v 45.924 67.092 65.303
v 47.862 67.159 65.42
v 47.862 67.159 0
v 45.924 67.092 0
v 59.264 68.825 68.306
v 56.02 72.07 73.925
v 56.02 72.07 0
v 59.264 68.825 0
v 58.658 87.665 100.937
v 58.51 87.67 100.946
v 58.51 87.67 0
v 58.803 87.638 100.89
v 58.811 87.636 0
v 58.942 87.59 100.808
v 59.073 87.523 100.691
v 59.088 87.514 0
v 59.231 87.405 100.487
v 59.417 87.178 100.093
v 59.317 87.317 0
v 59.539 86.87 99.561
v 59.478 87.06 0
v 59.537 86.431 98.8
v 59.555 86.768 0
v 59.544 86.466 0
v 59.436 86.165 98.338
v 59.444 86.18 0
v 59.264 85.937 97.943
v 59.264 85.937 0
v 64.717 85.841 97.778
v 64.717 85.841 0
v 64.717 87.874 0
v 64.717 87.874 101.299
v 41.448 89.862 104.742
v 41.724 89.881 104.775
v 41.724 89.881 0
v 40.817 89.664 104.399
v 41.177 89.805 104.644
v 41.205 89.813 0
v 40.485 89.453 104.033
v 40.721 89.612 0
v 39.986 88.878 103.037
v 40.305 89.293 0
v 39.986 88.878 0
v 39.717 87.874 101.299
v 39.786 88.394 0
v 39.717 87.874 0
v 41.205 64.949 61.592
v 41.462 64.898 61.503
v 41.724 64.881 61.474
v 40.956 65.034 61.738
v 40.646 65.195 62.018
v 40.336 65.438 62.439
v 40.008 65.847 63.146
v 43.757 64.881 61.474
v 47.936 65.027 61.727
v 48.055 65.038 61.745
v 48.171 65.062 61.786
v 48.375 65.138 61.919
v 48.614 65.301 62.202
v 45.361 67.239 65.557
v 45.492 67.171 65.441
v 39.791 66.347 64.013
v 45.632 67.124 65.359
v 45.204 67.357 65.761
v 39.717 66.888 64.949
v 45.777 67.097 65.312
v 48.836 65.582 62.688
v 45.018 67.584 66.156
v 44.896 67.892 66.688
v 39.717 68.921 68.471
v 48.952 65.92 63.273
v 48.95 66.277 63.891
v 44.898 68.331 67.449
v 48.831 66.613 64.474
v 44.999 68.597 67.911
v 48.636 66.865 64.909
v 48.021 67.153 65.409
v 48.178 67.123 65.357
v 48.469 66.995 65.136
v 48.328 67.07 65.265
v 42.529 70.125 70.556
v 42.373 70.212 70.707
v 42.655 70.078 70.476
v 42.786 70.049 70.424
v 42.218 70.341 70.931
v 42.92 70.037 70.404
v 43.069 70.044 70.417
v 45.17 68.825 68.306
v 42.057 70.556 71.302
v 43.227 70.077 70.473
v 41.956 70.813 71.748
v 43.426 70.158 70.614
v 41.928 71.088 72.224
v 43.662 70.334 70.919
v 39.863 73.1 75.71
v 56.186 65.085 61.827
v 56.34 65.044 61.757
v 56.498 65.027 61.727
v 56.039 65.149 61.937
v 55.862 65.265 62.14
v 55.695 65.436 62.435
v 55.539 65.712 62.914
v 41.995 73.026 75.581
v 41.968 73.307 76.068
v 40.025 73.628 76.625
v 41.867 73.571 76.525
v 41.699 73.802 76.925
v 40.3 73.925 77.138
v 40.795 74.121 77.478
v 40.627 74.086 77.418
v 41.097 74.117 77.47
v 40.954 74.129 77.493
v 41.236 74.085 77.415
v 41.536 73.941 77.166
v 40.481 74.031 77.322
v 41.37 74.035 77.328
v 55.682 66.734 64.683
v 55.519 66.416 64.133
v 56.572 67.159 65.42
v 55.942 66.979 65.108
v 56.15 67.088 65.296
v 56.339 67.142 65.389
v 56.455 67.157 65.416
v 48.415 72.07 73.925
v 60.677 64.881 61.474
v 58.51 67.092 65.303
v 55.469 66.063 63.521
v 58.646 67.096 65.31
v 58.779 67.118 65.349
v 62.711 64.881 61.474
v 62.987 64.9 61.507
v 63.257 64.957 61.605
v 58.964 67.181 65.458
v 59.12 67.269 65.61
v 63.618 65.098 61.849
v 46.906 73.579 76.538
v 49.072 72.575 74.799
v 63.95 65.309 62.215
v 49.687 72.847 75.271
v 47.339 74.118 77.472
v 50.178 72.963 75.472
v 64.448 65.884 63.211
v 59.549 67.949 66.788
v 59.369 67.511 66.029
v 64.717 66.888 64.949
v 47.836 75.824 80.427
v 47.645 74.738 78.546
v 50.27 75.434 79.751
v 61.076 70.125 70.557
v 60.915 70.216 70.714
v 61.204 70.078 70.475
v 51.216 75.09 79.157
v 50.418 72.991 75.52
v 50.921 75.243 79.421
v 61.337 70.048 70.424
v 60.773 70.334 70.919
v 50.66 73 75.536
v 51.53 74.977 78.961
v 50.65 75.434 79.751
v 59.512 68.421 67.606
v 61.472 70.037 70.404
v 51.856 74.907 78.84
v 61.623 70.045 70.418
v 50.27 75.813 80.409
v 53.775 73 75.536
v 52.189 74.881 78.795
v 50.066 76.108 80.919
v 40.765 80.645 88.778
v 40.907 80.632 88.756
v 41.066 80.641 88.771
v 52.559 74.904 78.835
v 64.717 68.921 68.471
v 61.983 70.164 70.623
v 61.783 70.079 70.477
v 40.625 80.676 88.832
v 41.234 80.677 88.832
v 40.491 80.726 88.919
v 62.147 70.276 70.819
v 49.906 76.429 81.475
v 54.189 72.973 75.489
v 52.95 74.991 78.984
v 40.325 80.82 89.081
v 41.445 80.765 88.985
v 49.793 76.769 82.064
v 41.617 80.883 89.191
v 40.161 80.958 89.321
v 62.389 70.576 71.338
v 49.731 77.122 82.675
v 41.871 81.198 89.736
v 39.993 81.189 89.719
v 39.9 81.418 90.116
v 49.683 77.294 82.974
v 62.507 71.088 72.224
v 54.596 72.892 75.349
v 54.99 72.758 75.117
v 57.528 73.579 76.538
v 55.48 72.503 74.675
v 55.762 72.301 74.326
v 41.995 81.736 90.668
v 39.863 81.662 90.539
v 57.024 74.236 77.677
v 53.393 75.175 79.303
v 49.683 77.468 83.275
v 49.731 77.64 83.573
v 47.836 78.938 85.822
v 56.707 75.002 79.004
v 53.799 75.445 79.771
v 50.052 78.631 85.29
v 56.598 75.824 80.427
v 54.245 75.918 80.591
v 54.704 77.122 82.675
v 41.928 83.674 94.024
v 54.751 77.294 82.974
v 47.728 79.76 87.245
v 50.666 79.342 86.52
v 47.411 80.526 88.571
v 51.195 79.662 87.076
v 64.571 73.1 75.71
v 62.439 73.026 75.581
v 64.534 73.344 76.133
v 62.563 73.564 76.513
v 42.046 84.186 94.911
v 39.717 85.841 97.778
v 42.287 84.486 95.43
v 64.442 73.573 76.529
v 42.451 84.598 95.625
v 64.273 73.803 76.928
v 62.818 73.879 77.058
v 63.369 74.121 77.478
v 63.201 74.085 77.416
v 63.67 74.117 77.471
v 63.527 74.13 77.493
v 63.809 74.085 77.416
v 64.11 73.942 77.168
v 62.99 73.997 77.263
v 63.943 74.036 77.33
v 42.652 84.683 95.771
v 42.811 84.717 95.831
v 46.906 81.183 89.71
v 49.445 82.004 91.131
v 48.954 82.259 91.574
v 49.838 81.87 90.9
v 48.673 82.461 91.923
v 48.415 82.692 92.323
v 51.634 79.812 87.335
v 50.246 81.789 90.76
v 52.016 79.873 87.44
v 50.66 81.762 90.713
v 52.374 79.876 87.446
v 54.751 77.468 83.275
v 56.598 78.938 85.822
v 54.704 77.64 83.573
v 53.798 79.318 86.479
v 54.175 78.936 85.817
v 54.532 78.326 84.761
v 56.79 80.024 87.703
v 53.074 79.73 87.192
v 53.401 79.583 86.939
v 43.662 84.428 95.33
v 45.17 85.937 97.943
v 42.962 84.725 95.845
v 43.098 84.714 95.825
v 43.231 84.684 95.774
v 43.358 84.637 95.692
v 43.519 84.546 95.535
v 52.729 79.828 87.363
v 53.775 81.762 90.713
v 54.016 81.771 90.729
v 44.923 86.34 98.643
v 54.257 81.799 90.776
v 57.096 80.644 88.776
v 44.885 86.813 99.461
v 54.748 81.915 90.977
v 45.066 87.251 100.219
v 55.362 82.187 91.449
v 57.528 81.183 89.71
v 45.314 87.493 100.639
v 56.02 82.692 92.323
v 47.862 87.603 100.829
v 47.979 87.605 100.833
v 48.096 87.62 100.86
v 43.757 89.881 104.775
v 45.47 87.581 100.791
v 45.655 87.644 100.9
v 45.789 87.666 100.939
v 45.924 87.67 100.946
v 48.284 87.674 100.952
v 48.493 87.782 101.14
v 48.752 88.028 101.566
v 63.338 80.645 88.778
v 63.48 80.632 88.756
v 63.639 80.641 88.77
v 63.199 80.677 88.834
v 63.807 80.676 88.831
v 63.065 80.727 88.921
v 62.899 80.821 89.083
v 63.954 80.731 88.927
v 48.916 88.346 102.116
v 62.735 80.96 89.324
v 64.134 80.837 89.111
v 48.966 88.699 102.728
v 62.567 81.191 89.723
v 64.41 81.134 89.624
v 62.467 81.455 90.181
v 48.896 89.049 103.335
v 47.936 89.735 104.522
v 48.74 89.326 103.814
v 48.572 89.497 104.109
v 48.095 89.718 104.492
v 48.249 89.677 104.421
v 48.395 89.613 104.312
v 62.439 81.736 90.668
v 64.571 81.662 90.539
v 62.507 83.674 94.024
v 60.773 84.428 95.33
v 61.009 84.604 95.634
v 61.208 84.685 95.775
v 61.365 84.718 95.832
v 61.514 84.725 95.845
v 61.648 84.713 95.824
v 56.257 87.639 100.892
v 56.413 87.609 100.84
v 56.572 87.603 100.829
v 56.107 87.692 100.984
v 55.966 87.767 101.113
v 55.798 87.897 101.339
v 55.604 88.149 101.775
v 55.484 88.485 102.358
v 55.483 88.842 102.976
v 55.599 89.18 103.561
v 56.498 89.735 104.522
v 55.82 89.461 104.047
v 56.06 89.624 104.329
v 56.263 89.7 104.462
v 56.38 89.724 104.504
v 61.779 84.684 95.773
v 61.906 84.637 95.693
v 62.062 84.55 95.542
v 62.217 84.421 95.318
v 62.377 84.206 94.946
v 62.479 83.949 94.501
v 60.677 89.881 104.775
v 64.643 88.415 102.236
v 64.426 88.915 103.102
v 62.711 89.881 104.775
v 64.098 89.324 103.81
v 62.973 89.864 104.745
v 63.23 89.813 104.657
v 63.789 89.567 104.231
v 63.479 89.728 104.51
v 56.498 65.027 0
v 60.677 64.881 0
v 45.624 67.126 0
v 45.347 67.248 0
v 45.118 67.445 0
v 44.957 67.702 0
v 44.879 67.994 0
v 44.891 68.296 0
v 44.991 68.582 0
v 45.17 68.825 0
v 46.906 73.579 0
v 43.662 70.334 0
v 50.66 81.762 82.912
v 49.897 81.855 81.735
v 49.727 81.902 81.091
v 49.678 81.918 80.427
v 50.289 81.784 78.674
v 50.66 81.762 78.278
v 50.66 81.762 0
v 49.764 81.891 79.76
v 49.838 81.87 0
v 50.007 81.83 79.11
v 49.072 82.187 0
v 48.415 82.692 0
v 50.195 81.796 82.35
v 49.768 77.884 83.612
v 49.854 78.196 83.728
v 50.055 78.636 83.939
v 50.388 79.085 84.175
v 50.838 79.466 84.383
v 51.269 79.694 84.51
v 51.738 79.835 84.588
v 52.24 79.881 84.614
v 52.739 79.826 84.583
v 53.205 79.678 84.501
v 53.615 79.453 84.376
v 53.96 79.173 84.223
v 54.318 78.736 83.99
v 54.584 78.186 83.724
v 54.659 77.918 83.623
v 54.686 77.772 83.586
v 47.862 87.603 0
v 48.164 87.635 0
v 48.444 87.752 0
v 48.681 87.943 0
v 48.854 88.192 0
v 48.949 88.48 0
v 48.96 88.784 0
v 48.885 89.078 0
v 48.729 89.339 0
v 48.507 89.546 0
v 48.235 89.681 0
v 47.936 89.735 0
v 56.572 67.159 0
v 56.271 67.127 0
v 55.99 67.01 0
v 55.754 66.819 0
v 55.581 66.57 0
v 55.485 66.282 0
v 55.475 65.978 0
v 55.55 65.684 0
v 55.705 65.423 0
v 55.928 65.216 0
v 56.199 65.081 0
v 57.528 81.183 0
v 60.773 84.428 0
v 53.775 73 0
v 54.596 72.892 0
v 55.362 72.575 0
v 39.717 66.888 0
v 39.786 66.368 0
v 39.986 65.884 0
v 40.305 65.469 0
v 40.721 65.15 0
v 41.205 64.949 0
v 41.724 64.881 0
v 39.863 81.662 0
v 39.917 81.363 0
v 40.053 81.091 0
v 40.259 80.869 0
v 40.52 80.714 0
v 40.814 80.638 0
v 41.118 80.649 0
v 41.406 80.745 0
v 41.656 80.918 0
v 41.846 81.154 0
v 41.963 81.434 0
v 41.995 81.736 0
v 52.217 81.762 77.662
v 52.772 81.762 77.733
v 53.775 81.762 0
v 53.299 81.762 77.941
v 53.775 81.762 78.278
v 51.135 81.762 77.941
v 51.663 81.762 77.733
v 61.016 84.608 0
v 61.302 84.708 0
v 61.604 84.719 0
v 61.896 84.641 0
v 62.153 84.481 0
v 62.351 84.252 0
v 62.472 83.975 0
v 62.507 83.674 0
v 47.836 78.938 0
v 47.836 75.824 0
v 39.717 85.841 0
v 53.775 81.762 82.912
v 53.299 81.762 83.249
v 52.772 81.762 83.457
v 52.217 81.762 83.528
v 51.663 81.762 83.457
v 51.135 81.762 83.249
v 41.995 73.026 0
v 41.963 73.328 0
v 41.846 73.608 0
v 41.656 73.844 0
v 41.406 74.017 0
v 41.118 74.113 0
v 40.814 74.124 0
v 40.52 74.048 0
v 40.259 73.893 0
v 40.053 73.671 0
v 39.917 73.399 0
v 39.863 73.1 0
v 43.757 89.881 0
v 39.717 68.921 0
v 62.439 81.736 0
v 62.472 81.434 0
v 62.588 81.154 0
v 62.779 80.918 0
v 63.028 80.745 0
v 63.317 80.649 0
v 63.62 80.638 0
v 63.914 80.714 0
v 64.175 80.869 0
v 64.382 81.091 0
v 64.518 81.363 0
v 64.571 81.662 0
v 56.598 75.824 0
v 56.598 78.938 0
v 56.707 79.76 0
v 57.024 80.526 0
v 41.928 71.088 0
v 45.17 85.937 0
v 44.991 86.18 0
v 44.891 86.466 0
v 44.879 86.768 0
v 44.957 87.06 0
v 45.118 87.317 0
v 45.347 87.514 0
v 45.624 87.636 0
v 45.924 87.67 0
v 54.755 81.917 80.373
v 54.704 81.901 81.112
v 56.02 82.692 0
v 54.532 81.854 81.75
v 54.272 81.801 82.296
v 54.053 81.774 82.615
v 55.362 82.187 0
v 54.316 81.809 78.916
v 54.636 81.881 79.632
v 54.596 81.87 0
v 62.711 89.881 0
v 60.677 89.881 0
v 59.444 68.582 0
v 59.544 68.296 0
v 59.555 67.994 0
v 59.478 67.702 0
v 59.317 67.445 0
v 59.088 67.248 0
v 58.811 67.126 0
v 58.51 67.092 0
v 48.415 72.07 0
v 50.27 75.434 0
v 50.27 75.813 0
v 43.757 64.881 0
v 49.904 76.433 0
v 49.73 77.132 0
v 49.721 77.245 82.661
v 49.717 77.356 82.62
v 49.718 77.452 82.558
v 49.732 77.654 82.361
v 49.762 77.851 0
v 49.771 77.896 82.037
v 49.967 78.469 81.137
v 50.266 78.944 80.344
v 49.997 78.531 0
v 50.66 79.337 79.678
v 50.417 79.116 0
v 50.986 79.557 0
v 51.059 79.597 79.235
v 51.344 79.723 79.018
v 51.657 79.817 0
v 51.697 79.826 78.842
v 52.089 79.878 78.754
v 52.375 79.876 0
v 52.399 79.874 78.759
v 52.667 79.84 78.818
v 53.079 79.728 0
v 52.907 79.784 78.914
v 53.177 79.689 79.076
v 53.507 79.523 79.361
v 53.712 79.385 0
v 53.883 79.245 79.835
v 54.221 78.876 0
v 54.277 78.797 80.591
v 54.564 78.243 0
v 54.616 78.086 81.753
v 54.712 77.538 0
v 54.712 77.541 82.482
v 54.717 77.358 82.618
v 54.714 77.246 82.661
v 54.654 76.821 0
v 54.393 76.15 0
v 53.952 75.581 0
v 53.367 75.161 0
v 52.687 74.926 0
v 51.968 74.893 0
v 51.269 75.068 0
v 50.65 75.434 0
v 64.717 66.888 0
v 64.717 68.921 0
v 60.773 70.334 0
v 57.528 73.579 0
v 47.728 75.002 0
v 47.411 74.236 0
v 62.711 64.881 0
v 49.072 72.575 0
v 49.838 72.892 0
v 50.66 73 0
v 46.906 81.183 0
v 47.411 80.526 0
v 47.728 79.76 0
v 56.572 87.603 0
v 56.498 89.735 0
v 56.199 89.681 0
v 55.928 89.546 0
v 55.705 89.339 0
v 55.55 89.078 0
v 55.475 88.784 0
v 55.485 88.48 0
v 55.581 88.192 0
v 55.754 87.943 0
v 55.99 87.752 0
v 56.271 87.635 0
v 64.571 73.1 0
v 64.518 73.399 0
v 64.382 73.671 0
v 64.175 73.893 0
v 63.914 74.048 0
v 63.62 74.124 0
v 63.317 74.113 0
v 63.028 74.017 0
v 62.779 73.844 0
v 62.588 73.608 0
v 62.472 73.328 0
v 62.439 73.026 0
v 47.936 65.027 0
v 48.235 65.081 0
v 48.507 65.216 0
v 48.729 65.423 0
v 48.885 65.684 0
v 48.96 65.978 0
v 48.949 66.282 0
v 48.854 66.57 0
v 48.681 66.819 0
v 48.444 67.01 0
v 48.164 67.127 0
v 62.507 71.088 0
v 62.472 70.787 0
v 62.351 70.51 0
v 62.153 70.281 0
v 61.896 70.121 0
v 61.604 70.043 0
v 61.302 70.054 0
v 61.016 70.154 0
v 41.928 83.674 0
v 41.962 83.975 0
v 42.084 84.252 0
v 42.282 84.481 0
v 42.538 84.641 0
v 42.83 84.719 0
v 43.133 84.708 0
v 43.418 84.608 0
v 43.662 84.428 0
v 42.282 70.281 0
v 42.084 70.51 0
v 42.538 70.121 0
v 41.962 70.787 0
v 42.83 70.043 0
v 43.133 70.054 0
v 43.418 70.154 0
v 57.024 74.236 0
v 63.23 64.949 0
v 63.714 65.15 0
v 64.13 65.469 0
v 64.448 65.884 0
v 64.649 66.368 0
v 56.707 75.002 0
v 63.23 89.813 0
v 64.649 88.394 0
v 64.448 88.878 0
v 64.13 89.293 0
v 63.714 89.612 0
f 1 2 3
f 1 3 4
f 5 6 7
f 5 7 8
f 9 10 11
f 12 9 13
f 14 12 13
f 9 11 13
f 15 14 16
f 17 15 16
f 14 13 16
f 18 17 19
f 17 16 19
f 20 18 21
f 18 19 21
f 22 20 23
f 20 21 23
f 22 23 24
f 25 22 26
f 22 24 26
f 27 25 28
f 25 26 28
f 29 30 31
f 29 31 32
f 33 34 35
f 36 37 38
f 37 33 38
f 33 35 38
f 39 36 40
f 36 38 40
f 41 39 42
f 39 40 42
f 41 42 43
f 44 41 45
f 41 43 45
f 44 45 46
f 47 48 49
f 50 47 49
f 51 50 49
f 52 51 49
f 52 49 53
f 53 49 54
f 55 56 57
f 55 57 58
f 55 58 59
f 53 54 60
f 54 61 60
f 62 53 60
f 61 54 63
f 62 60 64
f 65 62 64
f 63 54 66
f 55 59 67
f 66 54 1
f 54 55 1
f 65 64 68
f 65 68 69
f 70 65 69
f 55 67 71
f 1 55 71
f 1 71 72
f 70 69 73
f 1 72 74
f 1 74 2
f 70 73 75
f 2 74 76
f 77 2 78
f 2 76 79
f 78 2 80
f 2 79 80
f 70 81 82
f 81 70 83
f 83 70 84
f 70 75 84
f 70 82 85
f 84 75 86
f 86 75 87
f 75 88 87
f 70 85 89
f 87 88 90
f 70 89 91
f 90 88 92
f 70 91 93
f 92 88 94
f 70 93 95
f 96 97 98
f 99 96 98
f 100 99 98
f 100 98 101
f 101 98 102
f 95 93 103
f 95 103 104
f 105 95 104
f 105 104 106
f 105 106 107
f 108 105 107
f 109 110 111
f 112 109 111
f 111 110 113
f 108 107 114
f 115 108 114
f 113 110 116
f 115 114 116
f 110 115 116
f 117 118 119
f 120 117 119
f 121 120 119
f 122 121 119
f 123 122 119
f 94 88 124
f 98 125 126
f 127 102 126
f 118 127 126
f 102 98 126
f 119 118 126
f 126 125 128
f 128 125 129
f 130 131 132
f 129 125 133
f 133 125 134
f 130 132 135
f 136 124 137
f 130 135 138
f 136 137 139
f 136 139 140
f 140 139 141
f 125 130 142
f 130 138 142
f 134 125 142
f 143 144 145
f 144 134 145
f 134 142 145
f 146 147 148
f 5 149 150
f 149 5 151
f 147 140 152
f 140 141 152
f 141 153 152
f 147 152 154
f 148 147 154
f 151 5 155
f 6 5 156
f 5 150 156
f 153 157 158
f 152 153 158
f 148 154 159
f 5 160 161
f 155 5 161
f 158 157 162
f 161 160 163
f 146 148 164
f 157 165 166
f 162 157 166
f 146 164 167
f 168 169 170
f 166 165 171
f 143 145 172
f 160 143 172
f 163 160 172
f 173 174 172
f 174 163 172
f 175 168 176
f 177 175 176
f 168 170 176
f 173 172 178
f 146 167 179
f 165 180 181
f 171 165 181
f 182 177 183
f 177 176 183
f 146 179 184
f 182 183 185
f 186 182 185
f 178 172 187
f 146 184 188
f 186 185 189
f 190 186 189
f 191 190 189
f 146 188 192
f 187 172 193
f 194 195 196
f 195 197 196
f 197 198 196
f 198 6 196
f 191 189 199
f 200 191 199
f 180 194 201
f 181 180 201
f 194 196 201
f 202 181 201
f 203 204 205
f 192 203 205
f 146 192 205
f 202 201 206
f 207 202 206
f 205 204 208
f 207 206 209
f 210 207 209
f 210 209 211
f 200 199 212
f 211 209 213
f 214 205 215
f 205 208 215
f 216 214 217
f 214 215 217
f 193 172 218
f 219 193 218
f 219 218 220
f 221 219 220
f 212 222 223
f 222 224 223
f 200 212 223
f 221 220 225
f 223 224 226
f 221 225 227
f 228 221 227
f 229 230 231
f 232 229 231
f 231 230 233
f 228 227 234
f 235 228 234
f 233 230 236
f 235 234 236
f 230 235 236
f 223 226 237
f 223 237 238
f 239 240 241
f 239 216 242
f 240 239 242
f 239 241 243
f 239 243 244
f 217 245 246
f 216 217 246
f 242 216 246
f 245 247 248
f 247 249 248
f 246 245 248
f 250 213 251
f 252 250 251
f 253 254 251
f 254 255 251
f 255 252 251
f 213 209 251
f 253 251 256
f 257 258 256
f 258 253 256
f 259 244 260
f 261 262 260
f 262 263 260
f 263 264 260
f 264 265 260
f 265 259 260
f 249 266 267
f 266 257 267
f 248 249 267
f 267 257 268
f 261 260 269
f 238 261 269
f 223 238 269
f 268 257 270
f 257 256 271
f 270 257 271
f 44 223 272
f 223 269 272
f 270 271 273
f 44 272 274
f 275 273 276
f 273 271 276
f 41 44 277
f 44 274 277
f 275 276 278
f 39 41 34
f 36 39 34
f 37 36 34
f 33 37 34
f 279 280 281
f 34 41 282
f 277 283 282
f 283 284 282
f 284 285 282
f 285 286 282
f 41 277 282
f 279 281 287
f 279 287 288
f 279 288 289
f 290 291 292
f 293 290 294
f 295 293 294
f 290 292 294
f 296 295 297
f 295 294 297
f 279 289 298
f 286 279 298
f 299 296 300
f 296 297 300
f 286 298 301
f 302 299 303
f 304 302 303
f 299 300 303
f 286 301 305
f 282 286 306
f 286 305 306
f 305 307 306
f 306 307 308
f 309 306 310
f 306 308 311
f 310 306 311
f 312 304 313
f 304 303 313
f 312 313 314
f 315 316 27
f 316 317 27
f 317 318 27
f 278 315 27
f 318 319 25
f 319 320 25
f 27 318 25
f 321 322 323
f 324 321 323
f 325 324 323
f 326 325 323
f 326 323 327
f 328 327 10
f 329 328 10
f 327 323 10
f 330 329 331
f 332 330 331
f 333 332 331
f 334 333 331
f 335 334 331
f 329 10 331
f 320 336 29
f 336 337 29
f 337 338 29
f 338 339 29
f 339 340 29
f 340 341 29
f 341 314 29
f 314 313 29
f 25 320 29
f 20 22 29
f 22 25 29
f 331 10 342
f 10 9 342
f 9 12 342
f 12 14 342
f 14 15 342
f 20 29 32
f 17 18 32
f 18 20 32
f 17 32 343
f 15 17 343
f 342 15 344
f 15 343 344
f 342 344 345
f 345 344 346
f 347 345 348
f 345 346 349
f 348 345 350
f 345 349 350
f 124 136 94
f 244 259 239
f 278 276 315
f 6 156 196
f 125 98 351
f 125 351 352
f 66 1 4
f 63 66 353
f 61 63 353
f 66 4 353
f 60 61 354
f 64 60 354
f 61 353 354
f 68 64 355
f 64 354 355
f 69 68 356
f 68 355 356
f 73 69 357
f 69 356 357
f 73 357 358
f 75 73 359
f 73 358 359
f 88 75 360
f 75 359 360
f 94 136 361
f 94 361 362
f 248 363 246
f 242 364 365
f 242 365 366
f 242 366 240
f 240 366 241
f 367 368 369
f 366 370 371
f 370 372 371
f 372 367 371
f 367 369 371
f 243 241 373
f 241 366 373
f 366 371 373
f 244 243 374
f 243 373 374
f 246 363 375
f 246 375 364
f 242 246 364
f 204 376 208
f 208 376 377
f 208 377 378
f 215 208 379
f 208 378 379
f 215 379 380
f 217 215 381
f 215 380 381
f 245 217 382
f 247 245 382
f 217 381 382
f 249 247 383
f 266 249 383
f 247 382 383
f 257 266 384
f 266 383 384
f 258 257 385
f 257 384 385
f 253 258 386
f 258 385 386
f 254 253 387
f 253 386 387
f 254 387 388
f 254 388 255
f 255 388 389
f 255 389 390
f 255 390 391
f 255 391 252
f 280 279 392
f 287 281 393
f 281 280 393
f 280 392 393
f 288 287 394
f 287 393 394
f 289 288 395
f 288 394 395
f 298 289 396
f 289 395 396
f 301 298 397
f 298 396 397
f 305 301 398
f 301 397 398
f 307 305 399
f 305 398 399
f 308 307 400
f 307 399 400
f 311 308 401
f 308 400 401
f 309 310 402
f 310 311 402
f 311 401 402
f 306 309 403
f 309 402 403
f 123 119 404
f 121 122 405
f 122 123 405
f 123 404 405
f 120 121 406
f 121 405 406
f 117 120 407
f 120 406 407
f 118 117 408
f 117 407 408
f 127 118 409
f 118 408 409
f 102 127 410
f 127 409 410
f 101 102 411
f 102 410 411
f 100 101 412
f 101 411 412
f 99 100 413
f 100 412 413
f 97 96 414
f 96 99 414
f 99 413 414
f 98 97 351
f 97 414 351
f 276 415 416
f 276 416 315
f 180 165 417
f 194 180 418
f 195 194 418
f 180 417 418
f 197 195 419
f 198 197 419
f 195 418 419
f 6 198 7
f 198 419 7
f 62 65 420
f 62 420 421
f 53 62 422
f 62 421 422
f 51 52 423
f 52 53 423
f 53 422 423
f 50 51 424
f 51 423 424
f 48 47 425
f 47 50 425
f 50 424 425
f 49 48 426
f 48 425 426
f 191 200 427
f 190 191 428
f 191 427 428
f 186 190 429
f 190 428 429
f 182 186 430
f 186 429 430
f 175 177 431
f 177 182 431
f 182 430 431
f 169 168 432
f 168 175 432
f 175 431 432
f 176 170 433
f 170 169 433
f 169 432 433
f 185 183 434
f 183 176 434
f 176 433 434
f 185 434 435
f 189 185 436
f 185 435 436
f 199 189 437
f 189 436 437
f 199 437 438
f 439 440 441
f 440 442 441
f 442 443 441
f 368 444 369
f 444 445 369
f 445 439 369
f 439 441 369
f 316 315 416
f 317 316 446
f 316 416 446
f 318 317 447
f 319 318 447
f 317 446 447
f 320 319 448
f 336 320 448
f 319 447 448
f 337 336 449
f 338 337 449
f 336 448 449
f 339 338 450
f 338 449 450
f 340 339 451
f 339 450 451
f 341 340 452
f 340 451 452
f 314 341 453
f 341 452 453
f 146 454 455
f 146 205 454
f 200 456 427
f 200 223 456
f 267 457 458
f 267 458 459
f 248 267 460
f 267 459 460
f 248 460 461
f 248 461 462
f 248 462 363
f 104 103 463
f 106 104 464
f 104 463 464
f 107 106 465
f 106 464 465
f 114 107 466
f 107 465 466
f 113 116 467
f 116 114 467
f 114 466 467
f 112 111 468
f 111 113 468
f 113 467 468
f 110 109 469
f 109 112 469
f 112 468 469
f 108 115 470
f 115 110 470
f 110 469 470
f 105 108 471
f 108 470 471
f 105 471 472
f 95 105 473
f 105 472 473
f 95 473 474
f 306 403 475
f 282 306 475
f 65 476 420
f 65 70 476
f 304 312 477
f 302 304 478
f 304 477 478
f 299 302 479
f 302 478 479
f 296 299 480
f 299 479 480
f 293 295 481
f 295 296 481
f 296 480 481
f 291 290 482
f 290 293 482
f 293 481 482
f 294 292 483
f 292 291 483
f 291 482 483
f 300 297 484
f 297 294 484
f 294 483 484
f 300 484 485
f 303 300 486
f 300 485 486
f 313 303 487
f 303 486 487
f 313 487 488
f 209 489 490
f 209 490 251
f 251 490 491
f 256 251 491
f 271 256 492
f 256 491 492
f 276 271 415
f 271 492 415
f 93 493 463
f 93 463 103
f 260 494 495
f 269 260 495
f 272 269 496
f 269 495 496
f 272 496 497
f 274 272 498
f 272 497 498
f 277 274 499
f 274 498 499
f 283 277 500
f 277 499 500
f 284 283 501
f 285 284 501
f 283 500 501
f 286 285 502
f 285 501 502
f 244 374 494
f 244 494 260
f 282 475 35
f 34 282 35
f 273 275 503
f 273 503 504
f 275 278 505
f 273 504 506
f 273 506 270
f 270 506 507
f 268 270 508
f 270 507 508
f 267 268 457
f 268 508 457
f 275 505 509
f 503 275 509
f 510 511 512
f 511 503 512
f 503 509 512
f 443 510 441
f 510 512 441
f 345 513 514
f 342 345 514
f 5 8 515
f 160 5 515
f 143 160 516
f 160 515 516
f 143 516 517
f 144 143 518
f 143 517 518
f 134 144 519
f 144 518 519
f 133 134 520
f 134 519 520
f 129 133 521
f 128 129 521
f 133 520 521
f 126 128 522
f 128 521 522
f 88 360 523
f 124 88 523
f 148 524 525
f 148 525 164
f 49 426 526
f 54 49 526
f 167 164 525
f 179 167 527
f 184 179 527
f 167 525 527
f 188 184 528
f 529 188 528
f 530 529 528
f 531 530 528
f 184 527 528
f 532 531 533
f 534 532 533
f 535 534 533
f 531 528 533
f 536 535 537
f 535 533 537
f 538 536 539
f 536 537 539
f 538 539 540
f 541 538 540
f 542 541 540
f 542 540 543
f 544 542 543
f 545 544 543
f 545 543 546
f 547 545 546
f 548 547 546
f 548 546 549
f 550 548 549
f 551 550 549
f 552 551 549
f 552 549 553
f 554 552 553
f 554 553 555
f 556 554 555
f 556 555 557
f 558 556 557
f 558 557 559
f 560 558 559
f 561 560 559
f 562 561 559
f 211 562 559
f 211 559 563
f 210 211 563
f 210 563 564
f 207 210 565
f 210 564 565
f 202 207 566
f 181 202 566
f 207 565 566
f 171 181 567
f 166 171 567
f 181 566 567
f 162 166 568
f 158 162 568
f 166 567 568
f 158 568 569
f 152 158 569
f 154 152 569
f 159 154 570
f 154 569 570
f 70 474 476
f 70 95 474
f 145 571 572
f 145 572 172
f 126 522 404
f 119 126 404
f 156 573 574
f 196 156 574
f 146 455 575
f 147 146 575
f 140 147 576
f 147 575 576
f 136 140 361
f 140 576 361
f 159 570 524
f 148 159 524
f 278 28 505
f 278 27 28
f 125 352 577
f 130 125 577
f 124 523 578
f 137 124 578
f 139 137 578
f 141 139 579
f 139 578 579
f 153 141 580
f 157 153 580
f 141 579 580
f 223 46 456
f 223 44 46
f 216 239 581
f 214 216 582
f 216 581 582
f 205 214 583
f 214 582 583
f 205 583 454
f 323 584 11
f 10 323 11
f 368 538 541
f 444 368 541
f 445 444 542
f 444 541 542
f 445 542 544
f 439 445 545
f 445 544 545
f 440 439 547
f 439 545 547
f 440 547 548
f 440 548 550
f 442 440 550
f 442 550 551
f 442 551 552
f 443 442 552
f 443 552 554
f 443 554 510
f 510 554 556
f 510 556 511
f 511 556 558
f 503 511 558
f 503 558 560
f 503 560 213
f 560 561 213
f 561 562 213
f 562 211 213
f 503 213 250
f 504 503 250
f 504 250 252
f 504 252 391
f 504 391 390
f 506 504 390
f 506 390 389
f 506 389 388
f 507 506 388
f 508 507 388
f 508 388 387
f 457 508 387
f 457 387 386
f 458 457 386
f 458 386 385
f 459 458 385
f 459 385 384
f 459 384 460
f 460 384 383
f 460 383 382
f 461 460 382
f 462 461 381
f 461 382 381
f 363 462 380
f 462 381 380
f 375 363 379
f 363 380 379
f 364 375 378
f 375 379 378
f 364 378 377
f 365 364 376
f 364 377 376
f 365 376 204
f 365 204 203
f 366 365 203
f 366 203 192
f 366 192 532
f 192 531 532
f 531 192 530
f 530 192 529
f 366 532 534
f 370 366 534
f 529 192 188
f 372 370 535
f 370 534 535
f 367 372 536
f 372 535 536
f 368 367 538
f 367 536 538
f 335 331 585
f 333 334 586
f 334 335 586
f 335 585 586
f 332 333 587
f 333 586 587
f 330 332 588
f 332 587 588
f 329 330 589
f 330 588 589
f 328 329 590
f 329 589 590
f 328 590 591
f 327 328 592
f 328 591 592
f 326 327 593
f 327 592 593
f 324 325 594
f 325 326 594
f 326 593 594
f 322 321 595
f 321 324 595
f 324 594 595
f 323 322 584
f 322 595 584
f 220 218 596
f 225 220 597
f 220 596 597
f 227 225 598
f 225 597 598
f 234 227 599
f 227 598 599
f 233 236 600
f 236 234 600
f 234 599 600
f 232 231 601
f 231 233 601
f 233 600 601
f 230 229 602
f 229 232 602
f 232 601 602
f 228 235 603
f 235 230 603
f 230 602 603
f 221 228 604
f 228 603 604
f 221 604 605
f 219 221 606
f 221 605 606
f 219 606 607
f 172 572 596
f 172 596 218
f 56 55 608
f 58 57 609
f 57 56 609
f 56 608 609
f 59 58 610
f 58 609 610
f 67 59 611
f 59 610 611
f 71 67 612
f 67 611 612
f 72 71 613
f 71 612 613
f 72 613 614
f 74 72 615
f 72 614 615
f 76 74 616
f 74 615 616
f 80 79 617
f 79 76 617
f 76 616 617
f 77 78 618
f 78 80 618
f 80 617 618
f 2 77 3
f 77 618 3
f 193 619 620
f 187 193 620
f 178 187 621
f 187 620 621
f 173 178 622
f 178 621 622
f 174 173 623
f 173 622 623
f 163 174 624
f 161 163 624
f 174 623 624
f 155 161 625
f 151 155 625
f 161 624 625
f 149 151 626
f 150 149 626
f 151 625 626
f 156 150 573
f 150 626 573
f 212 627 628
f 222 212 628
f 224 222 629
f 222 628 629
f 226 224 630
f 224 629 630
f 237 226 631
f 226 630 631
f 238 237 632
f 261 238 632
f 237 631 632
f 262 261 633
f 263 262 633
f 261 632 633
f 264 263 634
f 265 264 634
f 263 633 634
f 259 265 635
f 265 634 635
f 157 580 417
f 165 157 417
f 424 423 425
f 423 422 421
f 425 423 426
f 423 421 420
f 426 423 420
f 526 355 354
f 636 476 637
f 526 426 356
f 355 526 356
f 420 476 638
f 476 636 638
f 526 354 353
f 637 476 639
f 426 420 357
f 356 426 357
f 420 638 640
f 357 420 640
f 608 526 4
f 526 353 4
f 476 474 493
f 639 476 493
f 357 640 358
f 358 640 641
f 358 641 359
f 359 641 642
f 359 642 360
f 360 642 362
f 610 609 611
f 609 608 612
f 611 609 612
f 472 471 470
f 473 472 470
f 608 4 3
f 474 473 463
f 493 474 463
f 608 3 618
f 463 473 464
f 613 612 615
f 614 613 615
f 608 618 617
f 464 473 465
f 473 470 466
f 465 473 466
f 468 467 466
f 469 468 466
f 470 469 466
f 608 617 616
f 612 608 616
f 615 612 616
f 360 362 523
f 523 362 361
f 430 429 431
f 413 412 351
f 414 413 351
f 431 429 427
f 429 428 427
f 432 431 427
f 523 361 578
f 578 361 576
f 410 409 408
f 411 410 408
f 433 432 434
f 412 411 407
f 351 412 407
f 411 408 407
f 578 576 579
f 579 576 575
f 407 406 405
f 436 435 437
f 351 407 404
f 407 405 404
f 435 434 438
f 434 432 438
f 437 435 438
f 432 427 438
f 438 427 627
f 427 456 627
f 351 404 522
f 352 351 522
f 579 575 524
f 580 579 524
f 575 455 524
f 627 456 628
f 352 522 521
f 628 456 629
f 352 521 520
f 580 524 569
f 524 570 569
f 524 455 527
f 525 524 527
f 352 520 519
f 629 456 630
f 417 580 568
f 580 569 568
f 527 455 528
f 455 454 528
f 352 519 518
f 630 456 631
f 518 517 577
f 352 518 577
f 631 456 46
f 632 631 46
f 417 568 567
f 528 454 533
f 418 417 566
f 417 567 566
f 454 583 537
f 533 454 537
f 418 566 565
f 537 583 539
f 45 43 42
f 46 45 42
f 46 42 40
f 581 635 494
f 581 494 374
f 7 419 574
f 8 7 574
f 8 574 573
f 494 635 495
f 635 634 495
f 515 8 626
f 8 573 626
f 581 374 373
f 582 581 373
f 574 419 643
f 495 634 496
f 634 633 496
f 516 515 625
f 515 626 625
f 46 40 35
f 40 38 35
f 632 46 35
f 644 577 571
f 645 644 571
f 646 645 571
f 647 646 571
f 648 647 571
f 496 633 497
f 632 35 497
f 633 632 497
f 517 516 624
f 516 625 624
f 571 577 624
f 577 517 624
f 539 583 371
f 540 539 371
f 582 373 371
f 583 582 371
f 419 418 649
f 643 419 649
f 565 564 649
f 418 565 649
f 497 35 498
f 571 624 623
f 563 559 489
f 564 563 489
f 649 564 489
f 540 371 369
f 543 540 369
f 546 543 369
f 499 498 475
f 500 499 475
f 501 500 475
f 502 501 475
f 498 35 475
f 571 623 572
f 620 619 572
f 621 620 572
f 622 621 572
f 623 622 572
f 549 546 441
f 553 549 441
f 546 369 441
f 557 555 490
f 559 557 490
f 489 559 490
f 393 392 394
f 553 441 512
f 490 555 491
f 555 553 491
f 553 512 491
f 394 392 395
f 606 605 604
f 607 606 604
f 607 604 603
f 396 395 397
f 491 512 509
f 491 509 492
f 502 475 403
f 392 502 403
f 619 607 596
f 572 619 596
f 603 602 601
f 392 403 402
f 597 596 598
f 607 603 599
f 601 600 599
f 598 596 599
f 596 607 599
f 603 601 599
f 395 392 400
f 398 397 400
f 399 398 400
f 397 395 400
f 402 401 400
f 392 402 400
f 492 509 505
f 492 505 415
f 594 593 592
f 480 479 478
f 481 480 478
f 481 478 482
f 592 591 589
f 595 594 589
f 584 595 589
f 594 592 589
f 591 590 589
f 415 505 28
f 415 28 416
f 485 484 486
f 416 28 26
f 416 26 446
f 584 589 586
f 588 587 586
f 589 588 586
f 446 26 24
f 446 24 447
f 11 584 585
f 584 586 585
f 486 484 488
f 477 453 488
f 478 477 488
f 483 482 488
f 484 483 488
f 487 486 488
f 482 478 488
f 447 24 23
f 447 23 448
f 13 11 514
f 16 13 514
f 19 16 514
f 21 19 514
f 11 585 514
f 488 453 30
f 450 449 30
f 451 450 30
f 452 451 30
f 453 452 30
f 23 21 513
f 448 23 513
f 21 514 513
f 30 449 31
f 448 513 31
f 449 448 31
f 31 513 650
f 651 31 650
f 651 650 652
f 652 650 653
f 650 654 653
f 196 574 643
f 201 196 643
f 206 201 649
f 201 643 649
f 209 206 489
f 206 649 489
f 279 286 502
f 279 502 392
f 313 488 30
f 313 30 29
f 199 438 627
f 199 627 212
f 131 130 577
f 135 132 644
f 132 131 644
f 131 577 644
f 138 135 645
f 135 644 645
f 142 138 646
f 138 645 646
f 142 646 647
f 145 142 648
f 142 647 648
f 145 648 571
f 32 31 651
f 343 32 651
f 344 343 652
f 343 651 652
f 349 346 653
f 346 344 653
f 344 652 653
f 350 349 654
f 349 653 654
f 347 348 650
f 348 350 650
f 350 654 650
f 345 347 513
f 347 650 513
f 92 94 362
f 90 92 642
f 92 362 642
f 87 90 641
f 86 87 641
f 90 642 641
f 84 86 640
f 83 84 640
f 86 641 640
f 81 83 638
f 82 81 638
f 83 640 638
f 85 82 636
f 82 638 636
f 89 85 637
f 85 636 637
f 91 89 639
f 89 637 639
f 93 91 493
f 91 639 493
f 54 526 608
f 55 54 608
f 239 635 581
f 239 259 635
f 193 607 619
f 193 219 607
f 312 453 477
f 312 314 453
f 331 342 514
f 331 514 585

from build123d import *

# Parameters (mm, degrees)
BOSS_EXTRUDE1_DEPTH = 104.775
CUT_EXTRUDE1_DEPTH  = 141.290381243
SKETCH2_R           = 2.54
CUT_EXTRUDE2_DEPTH  = 151.322735518


with BuildPart() as part:
    # Model → Boss-Extrude1 (new body)
    with BuildSketch(Plane.XY):
        with BuildLine():
            Line((50.659960212, 72.999871414), (53.774553856, 72.999871414))
            ThreePointArc((53.774553856, 72.999871414), (54.989573754, 72.758188929), (56.019617887, 72.069935444))
            Line((56.019617887, 72.069935444), (59.264200891, 68.825352439))
            ThreePointArc((59.264200891, 68.825352439), (59.477513437, 67.701802895), (58.510322513, 67.091550869))
            Line((58.510322513, 67.091550869), (56.572487817, 67.159221548))
            ThreePointArc((56.572487817, 67.159221548), (55.4691069, 66.130302197), (56.498026251, 65.026921279))
            Line((56.498026251, 65.026921279), (60.677257034, 64.880979325))
            Line((60.677257034, 64.880979325), (62.710657034, 64.880979325))
            ThreePointArc((62.710657034, 64.880979325), (64.129537501, 65.468698857), (64.717257034, 66.887579325))
            Line((64.717257034, 66.887579325), (64.717257034, 68.920979325))
            Line((64.717257034, 68.920979325), (64.57131508, 73.100210108))
            ThreePointArc((64.57131508, 73.100210108), (63.467934162, 74.129129459), (62.439014811, 73.025748542))
            Line((62.439014811, 73.025748542), (62.50668549, 71.087913846))
            ThreePointArc((62.50668549, 71.087913846), (61.896433464, 70.120722922), (60.77288392, 70.334035468))
            Line((60.77288392, 70.334035468), (57.528300915, 73.578618472))
            ThreePointArc((57.528300915, 73.578618472), (56.84004743, 74.608662605), (56.598364945, 75.823682503))
            Line((56.598364945, 75.823682503), (56.598364945, 78.938276147))
            ThreePointArc((56.598364945, 78.938276147), (56.84004743, 80.153296044), (57.528300915, 81.183340177))
            Line((57.528300915, 81.183340177), (60.77288392, 84.427923182))
            ThreePointArc((60.77288392, 84.427923182), (61.896433464, 84.641235728), (62.50668549, 83.674044803))
            Line((62.50668549, 83.674044803), (62.439014811, 81.736210108))
            ThreePointArc((62.439014811, 81.736210108), (63.467934162, 80.63282919), (64.57131508, 81.661748542))
            Line((64.57131508, 81.661748542), (64.717257034, 85.840979325))
            Line((64.717257034, 85.840979325), (64.717257034, 87.874379325))
            ThreePointArc((64.717257034, 87.874379325), (64.129537501, 89.293259792), (62.710657034, 89.880979325))
            Line((62.710657034, 89.880979325), (60.677257034, 89.880979325))
            Line((60.677257034, 89.880979325), (56.498026251, 89.73503737))
            ThreePointArc((56.498026251, 89.73503737), (55.4691069, 88.631656452), (56.572487817, 87.602737101))
            Line((56.572487817, 87.602737101), (58.510322513, 87.67040778))
            ThreePointArc((58.510322513, 87.67040778), (59.477513437, 87.060155754), (59.264200891, 85.93660621))
            Line((59.264200891, 85.93660621), (56.019617887, 82.692023205))
            ThreePointArc((56.019617887, 82.692023205), (54.989573754, 82.00376972), (53.774553856, 81.762087236))
            Line((53.774553856, 81.762087236), (50.659960212, 81.762087236))
            ThreePointArc((50.659960212, 81.762087236), (49.444940315, 82.00376972), (48.414896182, 82.692023205))
            Line((48.414896182, 82.692023205), (45.170313177, 85.93660621))
            ThreePointArc((45.170313177, 85.93660621), (44.957000631, 87.060155754), (45.924191556, 87.67040778))
            Line((45.924191556, 87.67040778), (47.862026251, 87.602737101))
            ThreePointArc((47.862026251, 87.602737101), (48.965407169, 88.631656452), (47.936487817, 89.73503737))
            Line((47.936487817, 89.73503737), (43.757257034, 89.880979325))
            Line((43.757257034, 89.880979325), (41.723857034, 89.880979325))
            ThreePointArc((41.723857034, 89.880979325), (40.304976567, 89.293259792), (39.717257034, 87.874379325))
            Line((39.717257034, 87.874379325), (39.717257034, 85.840979325))
            Line((39.717257034, 85.840979325), (39.863198989, 81.661748542))
            ThreePointArc((39.863198989, 81.661748542), (40.966579907, 80.63282919), (41.995499258, 81.736210108))
            Line((41.995499258, 81.736210108), (41.927828579, 83.674044803))
            ThreePointArc((41.927828579, 83.674044803), (42.538080605, 84.641235728), (43.661630149, 84.427923182))
            Line((43.661630149, 84.427923182), (46.906213154, 81.183340177))
            ThreePointArc((46.906213154, 81.183340177), (47.594466639, 80.153296044), (47.836149123, 78.938276147))
            Line((47.836149123, 78.938276147), (47.836149123, 75.823682503))
            ThreePointArc((47.836149123, 75.823682503), (47.594466639, 74.608662605), (46.906213154, 73.578618472))
            Line((46.906213154, 73.578618472), (43.661630149, 70.334035468))
            ThreePointArc((43.661630149, 70.334035468), (42.538080605, 70.120722922), (41.927828579, 71.087913846))
            Line((41.927828579, 71.087913846), (41.995499258, 73.025748542))
            ThreePointArc((41.995499258, 73.025748542), (40.966579907, 74.129129459), (39.863198989, 73.100210108))
            Line((39.863198989, 73.100210108), (39.717257034, 68.920979325))
            Line((39.717257034, 68.920979325), (39.717257034, 66.887579325))
            ThreePointArc((39.717257034, 66.887579325), (40.304976567, 65.468698857), (41.723857034, 64.880979325))
            Line((41.723857034, 64.880979325), (43.757257034, 64.880979325))
            Line((43.757257034, 64.880979325), (47.936487817, 65.026921279))
            ThreePointArc((47.936487817, 65.026921279), (48.965407169, 66.130302197), (47.862026251, 67.159221548))
            Line((47.862026251, 67.159221548), (45.924191556, 67.091550869))
            ThreePointArc((45.924191556, 67.091550869), (44.957000631, 67.701802895), (45.170313177, 68.825352439))
            Line((45.170313177, 68.825352439), (48.414896182, 72.069935444))
            ThreePointArc((48.414896182, 72.069935444), (49.444940315, 72.758188929), (50.659960212, 72.999871414))
        make_face()
        with BuildLine():
            Line((50.64953831, 75.433607249), (50.269884959, 75.433607249))
            Line((50.269884959, 75.433607249), (50.269884959, 75.8132606))
            ThreePointArc((50.269884959, 75.8132606), (53.985023987, 79.148746278), (50.64953831, 75.433607249))
        make_face(mode=Mode.SUBTRACT)
    extrude(amount=BOSS_EXTRUDE1_DEPTH)

    # Sketch1 → Cut-Extrude1 (cut, through all)
    with BuildSketch(Plane(origin=(64.717257034, 0, 0), x_dir=(0, 0, -1), z_dir=(1, 0, 0))):
        Polygon((-104.775, 89.880979325), (-104.775, 64.880979325), (-61.473729811, 64.880979325), align=None)
    extrude(amount=-CUT_EXTRUDE1_DEPTH, mode=Mode.SUBTRACT)

    # Sketch2 → Cut-Extrude2 (cut, through all)
    with BuildSketch(Plane(origin=(0, 22.041828653, -12.725855706), x_dir=(1, 0, 0), z_dir=(0, -0.8660254037844364, 0.5000000000000041))):
        with Locations(Location((52.217257034, 110.678301344, 0), (0, 0, 232.185356083))):
            Circle(SKETCH2_R)
    extrude(amount=-CUT_EXTRUDE2_DEPTH, mode=Mode.SUBTRACT)


solid = part.part
